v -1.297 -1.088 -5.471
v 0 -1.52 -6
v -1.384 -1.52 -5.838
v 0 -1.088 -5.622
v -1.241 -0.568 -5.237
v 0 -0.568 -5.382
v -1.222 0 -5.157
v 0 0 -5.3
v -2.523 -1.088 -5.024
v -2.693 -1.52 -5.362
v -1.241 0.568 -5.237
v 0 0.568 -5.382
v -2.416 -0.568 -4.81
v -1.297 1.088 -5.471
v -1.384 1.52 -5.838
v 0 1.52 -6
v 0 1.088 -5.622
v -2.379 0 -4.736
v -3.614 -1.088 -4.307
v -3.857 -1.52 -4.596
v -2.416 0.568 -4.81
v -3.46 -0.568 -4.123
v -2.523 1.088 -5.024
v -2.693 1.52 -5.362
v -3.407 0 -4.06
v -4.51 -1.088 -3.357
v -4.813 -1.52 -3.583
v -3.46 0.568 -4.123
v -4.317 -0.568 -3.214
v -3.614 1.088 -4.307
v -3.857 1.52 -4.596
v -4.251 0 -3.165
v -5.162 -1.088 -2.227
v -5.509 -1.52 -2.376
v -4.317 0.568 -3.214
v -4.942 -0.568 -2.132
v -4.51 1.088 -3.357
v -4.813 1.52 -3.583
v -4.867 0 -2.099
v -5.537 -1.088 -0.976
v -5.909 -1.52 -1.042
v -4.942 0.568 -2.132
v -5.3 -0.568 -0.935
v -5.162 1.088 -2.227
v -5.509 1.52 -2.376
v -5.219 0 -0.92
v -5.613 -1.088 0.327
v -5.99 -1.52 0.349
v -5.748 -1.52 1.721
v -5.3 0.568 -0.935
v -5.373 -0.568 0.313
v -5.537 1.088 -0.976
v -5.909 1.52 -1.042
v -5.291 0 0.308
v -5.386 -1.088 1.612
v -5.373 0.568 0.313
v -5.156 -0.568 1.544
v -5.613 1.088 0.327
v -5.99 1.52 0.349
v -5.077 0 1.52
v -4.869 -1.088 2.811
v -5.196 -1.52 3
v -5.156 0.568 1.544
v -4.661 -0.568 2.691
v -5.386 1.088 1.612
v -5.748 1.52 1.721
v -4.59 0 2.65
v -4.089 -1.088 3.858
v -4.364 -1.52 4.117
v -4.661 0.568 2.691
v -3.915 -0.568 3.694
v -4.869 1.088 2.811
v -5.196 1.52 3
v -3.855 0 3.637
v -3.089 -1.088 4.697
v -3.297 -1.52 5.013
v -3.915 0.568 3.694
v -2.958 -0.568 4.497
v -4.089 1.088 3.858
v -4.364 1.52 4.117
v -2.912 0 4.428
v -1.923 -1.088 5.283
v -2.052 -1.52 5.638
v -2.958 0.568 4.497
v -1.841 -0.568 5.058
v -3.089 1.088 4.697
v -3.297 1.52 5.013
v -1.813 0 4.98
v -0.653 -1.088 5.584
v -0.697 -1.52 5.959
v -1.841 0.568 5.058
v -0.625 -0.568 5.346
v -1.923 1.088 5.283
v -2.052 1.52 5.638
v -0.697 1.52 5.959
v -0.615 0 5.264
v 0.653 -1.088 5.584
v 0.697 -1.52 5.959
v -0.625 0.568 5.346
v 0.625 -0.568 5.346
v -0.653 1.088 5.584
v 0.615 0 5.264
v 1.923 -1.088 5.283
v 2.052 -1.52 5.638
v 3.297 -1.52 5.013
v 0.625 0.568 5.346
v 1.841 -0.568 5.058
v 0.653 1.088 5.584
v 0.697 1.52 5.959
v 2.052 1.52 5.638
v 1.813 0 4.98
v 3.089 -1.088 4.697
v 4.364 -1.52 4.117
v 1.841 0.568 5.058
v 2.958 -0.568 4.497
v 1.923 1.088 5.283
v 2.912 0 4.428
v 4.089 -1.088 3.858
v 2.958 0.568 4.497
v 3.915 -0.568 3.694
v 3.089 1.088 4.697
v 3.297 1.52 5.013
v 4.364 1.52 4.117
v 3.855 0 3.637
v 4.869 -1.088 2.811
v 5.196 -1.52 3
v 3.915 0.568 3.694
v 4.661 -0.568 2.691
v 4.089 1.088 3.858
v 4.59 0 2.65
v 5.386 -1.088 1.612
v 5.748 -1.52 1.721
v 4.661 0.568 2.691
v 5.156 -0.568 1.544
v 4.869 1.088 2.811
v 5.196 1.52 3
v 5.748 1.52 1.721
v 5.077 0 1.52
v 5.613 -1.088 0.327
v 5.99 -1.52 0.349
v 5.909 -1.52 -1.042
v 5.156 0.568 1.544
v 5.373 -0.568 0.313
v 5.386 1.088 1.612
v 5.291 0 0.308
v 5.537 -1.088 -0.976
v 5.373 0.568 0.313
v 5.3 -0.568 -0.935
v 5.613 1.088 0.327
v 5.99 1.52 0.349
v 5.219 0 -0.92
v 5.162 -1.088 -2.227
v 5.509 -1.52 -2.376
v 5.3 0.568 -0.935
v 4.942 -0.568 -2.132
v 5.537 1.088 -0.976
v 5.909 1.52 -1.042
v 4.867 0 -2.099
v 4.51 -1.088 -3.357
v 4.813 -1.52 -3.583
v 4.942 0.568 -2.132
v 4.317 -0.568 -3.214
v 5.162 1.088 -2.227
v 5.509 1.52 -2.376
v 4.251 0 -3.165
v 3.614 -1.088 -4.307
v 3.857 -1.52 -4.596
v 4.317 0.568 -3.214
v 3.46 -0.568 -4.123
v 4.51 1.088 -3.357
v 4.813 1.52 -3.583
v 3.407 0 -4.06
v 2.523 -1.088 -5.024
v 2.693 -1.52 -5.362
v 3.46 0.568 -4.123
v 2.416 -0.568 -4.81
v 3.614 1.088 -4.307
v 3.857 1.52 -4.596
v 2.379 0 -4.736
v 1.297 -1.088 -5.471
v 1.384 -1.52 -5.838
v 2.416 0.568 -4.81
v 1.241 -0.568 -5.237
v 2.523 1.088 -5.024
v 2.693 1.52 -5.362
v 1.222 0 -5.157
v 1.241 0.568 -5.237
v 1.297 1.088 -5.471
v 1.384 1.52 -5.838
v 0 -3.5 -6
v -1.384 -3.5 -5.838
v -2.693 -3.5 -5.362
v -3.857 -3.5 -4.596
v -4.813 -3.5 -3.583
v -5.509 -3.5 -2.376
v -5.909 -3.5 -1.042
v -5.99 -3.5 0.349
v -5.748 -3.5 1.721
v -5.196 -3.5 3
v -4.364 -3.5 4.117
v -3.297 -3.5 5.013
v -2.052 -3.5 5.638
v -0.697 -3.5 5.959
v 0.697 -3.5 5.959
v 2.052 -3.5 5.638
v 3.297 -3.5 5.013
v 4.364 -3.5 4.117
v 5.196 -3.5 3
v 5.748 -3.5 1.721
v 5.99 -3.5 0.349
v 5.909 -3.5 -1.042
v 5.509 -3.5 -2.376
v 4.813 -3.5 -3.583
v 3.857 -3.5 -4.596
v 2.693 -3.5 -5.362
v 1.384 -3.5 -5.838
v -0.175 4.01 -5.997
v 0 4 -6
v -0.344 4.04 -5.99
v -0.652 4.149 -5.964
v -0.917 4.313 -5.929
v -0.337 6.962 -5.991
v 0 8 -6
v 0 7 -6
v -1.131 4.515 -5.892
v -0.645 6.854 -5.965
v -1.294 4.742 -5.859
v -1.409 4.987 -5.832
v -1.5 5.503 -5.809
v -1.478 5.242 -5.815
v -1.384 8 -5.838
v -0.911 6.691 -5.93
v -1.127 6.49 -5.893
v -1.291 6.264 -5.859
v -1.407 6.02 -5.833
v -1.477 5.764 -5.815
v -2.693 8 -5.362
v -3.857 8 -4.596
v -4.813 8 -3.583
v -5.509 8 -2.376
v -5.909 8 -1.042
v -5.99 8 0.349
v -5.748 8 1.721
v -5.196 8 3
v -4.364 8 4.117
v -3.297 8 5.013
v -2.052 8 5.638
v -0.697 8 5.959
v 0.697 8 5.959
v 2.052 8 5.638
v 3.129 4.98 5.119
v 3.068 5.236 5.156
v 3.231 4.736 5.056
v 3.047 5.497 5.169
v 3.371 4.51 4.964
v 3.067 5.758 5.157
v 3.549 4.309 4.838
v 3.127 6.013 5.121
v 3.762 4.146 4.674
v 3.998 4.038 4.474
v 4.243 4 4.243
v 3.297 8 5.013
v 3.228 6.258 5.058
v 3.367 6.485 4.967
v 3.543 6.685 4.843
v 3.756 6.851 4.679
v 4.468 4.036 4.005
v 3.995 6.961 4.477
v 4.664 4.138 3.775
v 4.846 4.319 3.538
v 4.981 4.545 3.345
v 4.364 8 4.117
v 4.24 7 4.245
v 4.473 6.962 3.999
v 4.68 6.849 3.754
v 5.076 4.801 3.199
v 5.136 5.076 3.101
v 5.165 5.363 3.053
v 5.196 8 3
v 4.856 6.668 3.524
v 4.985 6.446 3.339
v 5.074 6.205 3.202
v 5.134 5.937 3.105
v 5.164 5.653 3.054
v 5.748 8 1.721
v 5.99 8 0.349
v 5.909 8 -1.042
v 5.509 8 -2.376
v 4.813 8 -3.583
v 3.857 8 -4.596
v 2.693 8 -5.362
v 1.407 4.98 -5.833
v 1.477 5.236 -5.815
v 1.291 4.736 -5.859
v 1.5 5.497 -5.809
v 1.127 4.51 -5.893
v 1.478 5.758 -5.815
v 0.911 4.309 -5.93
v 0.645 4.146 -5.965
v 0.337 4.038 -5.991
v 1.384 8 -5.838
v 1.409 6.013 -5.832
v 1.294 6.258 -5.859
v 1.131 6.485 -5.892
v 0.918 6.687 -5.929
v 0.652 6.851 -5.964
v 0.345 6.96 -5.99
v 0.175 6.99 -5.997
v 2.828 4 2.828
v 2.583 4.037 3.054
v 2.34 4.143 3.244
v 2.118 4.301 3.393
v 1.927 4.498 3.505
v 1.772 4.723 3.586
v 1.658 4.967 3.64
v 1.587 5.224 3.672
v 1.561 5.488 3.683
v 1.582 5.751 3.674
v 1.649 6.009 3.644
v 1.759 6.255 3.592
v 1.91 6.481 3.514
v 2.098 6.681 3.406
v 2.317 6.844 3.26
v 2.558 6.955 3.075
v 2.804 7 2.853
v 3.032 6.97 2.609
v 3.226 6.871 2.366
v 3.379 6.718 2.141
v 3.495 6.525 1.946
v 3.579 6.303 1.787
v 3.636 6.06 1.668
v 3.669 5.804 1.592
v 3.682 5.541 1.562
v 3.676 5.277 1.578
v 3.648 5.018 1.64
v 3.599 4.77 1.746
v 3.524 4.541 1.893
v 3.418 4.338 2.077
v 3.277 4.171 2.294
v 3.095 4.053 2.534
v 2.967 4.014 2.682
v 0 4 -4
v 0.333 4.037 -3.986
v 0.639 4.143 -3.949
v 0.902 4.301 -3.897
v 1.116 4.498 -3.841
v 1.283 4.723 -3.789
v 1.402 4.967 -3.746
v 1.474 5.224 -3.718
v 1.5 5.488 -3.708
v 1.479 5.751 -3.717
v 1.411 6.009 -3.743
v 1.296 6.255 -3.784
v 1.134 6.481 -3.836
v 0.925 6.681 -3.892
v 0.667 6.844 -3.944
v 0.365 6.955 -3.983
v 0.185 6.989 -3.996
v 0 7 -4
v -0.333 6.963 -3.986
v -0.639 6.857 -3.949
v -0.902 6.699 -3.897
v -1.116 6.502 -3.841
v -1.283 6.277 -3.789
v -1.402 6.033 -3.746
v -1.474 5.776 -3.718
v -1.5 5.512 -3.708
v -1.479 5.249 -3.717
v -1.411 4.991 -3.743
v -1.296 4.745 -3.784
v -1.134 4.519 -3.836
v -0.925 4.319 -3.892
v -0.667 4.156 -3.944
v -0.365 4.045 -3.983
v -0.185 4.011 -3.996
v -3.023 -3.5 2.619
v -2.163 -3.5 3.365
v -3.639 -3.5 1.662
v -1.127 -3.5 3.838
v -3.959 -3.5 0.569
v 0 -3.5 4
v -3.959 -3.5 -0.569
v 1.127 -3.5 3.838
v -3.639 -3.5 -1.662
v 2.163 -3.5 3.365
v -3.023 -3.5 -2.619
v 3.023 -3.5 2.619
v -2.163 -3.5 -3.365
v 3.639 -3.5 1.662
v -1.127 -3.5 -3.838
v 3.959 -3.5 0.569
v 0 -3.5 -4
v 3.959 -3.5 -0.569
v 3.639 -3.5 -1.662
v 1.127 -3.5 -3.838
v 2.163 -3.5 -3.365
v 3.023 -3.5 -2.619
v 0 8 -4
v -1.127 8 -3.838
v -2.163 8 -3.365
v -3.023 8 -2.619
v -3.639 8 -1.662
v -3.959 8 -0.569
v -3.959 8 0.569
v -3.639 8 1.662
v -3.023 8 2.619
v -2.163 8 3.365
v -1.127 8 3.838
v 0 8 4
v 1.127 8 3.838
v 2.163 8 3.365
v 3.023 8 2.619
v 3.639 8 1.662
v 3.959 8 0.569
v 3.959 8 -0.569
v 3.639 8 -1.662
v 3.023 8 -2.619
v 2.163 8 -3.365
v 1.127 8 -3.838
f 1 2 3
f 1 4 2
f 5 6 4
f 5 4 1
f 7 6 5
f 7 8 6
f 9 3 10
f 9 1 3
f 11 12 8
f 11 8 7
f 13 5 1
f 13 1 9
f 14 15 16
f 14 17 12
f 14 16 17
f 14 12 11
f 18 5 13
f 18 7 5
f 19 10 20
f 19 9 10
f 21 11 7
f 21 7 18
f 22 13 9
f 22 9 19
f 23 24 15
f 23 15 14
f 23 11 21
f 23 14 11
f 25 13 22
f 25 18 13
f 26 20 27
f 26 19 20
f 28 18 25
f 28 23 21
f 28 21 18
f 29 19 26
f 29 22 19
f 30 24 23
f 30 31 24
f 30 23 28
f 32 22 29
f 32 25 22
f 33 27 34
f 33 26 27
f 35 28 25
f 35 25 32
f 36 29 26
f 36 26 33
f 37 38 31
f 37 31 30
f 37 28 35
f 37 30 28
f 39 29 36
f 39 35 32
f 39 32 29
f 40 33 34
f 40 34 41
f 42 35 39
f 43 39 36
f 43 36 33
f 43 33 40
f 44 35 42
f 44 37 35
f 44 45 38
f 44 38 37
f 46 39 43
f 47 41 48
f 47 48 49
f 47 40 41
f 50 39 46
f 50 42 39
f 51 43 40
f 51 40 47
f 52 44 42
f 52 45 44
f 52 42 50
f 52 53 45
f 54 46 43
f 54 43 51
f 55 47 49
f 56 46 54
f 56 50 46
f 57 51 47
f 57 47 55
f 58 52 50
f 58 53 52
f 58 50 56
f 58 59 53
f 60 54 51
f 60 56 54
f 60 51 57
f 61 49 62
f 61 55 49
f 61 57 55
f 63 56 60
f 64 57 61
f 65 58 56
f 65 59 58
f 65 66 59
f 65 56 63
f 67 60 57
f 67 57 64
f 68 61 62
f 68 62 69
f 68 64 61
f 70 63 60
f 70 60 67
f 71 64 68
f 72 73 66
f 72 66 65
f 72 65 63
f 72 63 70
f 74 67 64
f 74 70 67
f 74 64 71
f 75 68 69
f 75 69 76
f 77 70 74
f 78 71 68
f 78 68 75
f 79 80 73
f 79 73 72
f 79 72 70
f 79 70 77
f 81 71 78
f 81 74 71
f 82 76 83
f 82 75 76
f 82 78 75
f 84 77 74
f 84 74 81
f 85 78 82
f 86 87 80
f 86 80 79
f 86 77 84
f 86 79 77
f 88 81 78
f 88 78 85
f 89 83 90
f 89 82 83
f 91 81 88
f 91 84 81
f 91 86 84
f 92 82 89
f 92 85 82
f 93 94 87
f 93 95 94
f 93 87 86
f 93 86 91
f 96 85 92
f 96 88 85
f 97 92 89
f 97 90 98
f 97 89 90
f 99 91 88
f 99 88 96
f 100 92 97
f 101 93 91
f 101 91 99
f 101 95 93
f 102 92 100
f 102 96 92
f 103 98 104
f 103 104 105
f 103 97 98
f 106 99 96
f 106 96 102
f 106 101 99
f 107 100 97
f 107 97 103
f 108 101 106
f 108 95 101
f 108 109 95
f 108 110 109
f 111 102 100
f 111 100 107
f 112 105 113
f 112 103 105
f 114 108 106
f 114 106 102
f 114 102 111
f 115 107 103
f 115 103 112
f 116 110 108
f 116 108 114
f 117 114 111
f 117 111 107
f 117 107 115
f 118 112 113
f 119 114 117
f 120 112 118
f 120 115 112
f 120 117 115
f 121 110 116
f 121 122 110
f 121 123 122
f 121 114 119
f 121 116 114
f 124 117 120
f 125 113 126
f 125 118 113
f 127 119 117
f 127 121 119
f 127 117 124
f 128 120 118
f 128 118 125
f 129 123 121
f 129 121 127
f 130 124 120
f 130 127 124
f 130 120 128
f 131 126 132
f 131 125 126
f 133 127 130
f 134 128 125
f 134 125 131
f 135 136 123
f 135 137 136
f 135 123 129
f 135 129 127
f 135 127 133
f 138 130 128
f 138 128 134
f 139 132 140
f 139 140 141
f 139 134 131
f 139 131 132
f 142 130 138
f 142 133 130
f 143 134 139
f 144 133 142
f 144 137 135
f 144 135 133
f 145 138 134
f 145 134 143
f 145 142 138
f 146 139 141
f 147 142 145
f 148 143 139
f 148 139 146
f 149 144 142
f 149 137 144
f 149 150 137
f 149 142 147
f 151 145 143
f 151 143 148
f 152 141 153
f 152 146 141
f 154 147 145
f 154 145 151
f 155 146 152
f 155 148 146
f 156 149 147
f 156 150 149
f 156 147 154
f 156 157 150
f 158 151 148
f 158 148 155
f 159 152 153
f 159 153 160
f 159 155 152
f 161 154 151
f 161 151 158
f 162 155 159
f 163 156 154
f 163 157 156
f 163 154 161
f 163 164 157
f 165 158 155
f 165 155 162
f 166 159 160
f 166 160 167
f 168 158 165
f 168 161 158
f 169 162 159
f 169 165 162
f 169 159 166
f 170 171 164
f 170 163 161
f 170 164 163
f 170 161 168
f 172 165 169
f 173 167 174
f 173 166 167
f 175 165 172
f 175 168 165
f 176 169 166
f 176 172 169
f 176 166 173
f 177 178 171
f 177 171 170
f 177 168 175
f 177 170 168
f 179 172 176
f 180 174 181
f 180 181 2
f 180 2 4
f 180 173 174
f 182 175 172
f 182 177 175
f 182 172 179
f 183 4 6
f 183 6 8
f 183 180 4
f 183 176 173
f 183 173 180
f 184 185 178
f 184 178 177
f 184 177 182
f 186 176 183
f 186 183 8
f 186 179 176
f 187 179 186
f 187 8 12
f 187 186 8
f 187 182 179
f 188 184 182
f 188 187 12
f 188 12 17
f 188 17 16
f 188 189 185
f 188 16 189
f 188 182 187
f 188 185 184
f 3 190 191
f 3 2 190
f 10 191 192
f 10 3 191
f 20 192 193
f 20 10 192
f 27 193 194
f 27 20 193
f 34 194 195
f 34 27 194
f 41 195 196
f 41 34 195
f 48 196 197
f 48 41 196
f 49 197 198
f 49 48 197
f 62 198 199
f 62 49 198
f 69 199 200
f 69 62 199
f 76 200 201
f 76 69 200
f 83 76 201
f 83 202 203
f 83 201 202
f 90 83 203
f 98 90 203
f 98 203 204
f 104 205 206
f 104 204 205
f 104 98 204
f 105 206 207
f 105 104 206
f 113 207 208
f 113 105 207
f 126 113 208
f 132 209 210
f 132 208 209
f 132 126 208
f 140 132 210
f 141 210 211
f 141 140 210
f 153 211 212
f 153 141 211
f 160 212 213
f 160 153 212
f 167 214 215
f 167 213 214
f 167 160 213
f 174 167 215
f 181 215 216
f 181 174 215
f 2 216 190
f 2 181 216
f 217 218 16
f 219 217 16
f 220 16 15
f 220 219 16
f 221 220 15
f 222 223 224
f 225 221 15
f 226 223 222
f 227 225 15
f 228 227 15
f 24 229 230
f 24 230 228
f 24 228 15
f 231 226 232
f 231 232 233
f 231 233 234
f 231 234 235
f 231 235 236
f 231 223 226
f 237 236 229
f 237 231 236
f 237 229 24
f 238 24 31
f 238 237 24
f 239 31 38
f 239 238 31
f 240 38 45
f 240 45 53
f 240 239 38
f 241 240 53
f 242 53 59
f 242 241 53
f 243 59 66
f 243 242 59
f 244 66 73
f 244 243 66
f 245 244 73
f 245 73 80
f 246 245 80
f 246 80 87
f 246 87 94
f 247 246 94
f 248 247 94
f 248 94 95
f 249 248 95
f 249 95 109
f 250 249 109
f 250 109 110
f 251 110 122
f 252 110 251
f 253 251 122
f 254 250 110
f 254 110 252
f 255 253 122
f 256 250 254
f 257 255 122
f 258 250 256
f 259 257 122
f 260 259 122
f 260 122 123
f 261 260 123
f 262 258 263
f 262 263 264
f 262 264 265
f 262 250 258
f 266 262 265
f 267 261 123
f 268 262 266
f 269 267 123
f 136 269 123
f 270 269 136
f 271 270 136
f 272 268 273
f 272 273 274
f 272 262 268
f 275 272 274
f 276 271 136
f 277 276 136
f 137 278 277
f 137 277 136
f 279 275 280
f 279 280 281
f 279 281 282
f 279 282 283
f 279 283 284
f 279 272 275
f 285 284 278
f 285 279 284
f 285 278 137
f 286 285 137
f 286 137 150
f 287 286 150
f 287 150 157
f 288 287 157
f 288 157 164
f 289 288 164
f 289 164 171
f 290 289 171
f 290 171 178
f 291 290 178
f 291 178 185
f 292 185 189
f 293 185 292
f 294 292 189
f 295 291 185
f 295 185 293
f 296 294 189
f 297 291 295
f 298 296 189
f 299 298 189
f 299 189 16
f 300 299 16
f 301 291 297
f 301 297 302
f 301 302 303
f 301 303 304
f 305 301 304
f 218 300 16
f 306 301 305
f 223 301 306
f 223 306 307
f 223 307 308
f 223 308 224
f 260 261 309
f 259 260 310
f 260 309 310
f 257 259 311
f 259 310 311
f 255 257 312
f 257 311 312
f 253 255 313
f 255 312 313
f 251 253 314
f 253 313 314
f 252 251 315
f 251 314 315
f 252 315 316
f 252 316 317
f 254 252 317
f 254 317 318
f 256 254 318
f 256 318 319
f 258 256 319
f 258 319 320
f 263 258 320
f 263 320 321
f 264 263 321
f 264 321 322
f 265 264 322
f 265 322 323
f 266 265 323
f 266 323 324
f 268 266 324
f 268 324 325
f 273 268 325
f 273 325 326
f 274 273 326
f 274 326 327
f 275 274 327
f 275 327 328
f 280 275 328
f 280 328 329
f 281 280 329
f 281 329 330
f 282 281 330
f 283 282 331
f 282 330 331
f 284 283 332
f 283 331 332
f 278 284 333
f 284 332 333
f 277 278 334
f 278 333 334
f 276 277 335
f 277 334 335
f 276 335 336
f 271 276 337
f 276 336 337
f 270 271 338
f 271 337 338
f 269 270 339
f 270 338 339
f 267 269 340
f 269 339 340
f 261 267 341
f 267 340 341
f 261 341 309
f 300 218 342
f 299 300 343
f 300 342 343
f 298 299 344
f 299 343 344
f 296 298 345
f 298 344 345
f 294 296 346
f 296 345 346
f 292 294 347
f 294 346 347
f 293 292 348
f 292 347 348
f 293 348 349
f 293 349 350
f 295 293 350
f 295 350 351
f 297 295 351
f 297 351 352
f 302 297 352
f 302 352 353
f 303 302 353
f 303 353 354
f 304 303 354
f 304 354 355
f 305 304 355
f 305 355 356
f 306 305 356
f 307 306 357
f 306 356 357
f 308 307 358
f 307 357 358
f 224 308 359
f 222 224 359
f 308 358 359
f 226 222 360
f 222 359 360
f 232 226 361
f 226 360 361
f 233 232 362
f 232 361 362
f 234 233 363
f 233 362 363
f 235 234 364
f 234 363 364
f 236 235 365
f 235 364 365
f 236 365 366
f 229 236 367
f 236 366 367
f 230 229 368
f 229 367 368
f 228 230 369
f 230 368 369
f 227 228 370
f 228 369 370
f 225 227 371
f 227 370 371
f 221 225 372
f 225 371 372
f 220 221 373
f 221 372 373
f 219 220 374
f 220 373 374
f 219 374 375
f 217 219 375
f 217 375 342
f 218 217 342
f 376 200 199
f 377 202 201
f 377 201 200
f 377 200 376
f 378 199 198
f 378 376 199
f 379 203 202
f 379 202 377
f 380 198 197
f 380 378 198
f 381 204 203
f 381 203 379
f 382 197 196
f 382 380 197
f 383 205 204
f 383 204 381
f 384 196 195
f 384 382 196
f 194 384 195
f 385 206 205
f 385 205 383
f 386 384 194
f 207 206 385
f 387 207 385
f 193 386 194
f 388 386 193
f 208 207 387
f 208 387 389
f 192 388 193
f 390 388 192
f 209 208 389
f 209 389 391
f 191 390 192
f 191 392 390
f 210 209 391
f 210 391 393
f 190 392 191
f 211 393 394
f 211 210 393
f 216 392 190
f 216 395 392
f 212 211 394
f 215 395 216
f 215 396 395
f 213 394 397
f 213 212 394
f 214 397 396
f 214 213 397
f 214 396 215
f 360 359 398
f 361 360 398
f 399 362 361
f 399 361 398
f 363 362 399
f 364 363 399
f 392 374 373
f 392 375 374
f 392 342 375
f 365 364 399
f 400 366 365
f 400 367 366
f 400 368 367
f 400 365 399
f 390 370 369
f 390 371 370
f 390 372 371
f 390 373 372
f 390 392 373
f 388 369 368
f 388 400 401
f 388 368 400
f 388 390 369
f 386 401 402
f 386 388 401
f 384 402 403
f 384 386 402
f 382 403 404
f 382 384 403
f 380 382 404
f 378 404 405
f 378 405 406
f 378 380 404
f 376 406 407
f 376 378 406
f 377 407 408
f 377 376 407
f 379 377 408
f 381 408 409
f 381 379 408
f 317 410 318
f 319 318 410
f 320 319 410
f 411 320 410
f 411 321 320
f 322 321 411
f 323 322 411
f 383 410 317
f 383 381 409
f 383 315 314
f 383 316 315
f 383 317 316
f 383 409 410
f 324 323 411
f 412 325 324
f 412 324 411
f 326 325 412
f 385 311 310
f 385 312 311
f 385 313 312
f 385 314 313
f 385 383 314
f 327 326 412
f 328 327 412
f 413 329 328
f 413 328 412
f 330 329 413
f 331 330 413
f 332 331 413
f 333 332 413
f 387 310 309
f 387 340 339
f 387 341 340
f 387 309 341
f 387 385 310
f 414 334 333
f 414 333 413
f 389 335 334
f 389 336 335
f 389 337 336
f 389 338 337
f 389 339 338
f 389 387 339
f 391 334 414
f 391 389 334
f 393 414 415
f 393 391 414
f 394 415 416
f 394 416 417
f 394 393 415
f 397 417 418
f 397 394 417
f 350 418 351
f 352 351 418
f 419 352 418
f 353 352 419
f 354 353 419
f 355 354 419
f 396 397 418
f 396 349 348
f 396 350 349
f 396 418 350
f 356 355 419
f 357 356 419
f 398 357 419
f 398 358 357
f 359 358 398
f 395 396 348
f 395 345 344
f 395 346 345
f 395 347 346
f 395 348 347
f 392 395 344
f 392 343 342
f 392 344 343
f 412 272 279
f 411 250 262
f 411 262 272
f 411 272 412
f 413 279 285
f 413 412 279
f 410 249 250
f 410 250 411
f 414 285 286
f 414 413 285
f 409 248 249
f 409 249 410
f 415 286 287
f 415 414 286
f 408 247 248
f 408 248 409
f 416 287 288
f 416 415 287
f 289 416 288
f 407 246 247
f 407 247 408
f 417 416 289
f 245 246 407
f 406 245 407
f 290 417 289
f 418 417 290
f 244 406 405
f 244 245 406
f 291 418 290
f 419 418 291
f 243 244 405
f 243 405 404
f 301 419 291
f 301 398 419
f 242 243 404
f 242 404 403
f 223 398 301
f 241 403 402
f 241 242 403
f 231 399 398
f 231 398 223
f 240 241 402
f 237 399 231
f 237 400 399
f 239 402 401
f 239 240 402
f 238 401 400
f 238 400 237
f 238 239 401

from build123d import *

# Parameters (mm, degrees)
SKETCH3_R          = 1.5
CUT_EXTRUDE1_DEPTH = 12.66190379
CIRPATTERN1_COUNT  = 2
CIRPATTERN1_ANGLE  = 135
CUT_EXTRUDE2_START = -0.5
SKETCH4_R          = 6
CUT_EXTRUDE2_DEPTH = 0.5


with BuildPart() as part:
    # Sketch2 → Revolve1 (revolve)
    with BuildSketch(Plane.XY):
        with BuildLine():
            Line((6, 8), (4, 8))
            Line((4, 8), (4, -4))
            Line((4, -4), (6, -4))
            Line((6, -4), (6, -1.519868415))
            ThreePointArc((6, -1.519868415), (5.3, 0), (6, 1.519868415))
            Line((6, 1.519868415), (6, 4))
            Line((6, 4), (6, 8))
        make_face()
    revolve(axis=Axis((0, 0, 0), (0, 1, 0)))

    # Sketch3 → Cut-Extrude1 (cut, through all)
    with BuildSketch(Plane.XY):
        with Locations((0, 5.5)):
            Circle(SKETCH3_R)
    cut_extrude1 = extrude(amount=-CUT_EXTRUDE1_DEPTH, mode=Mode.SUBTRACT)

    # CirPattern1: Cut-Extrude1 ×2 about axis
    cirpattern1_axis = Axis((0, 8, 0), (0, -1, 0))
    for i in range(1, CIRPATTERN1_COUNT):
        add(cut_extrude1.rotate(cirpattern1_axis, i * CIRPATTERN1_ANGLE / (CIRPATTERN1_COUNT - 1)), mode=Mode.SUBTRACT)

    # Sketch4 → Cut-Extrude2 (cut)
    with BuildSketch(Plane.XZ.offset(4).offset(CUT_EXTRUDE2_START)):
        Circle(SKETCH4_R)
    extrude(amount=CUT_EXTRUDE2_DEPTH, mode=Mode.SUBTRACT)


solid = part.part
